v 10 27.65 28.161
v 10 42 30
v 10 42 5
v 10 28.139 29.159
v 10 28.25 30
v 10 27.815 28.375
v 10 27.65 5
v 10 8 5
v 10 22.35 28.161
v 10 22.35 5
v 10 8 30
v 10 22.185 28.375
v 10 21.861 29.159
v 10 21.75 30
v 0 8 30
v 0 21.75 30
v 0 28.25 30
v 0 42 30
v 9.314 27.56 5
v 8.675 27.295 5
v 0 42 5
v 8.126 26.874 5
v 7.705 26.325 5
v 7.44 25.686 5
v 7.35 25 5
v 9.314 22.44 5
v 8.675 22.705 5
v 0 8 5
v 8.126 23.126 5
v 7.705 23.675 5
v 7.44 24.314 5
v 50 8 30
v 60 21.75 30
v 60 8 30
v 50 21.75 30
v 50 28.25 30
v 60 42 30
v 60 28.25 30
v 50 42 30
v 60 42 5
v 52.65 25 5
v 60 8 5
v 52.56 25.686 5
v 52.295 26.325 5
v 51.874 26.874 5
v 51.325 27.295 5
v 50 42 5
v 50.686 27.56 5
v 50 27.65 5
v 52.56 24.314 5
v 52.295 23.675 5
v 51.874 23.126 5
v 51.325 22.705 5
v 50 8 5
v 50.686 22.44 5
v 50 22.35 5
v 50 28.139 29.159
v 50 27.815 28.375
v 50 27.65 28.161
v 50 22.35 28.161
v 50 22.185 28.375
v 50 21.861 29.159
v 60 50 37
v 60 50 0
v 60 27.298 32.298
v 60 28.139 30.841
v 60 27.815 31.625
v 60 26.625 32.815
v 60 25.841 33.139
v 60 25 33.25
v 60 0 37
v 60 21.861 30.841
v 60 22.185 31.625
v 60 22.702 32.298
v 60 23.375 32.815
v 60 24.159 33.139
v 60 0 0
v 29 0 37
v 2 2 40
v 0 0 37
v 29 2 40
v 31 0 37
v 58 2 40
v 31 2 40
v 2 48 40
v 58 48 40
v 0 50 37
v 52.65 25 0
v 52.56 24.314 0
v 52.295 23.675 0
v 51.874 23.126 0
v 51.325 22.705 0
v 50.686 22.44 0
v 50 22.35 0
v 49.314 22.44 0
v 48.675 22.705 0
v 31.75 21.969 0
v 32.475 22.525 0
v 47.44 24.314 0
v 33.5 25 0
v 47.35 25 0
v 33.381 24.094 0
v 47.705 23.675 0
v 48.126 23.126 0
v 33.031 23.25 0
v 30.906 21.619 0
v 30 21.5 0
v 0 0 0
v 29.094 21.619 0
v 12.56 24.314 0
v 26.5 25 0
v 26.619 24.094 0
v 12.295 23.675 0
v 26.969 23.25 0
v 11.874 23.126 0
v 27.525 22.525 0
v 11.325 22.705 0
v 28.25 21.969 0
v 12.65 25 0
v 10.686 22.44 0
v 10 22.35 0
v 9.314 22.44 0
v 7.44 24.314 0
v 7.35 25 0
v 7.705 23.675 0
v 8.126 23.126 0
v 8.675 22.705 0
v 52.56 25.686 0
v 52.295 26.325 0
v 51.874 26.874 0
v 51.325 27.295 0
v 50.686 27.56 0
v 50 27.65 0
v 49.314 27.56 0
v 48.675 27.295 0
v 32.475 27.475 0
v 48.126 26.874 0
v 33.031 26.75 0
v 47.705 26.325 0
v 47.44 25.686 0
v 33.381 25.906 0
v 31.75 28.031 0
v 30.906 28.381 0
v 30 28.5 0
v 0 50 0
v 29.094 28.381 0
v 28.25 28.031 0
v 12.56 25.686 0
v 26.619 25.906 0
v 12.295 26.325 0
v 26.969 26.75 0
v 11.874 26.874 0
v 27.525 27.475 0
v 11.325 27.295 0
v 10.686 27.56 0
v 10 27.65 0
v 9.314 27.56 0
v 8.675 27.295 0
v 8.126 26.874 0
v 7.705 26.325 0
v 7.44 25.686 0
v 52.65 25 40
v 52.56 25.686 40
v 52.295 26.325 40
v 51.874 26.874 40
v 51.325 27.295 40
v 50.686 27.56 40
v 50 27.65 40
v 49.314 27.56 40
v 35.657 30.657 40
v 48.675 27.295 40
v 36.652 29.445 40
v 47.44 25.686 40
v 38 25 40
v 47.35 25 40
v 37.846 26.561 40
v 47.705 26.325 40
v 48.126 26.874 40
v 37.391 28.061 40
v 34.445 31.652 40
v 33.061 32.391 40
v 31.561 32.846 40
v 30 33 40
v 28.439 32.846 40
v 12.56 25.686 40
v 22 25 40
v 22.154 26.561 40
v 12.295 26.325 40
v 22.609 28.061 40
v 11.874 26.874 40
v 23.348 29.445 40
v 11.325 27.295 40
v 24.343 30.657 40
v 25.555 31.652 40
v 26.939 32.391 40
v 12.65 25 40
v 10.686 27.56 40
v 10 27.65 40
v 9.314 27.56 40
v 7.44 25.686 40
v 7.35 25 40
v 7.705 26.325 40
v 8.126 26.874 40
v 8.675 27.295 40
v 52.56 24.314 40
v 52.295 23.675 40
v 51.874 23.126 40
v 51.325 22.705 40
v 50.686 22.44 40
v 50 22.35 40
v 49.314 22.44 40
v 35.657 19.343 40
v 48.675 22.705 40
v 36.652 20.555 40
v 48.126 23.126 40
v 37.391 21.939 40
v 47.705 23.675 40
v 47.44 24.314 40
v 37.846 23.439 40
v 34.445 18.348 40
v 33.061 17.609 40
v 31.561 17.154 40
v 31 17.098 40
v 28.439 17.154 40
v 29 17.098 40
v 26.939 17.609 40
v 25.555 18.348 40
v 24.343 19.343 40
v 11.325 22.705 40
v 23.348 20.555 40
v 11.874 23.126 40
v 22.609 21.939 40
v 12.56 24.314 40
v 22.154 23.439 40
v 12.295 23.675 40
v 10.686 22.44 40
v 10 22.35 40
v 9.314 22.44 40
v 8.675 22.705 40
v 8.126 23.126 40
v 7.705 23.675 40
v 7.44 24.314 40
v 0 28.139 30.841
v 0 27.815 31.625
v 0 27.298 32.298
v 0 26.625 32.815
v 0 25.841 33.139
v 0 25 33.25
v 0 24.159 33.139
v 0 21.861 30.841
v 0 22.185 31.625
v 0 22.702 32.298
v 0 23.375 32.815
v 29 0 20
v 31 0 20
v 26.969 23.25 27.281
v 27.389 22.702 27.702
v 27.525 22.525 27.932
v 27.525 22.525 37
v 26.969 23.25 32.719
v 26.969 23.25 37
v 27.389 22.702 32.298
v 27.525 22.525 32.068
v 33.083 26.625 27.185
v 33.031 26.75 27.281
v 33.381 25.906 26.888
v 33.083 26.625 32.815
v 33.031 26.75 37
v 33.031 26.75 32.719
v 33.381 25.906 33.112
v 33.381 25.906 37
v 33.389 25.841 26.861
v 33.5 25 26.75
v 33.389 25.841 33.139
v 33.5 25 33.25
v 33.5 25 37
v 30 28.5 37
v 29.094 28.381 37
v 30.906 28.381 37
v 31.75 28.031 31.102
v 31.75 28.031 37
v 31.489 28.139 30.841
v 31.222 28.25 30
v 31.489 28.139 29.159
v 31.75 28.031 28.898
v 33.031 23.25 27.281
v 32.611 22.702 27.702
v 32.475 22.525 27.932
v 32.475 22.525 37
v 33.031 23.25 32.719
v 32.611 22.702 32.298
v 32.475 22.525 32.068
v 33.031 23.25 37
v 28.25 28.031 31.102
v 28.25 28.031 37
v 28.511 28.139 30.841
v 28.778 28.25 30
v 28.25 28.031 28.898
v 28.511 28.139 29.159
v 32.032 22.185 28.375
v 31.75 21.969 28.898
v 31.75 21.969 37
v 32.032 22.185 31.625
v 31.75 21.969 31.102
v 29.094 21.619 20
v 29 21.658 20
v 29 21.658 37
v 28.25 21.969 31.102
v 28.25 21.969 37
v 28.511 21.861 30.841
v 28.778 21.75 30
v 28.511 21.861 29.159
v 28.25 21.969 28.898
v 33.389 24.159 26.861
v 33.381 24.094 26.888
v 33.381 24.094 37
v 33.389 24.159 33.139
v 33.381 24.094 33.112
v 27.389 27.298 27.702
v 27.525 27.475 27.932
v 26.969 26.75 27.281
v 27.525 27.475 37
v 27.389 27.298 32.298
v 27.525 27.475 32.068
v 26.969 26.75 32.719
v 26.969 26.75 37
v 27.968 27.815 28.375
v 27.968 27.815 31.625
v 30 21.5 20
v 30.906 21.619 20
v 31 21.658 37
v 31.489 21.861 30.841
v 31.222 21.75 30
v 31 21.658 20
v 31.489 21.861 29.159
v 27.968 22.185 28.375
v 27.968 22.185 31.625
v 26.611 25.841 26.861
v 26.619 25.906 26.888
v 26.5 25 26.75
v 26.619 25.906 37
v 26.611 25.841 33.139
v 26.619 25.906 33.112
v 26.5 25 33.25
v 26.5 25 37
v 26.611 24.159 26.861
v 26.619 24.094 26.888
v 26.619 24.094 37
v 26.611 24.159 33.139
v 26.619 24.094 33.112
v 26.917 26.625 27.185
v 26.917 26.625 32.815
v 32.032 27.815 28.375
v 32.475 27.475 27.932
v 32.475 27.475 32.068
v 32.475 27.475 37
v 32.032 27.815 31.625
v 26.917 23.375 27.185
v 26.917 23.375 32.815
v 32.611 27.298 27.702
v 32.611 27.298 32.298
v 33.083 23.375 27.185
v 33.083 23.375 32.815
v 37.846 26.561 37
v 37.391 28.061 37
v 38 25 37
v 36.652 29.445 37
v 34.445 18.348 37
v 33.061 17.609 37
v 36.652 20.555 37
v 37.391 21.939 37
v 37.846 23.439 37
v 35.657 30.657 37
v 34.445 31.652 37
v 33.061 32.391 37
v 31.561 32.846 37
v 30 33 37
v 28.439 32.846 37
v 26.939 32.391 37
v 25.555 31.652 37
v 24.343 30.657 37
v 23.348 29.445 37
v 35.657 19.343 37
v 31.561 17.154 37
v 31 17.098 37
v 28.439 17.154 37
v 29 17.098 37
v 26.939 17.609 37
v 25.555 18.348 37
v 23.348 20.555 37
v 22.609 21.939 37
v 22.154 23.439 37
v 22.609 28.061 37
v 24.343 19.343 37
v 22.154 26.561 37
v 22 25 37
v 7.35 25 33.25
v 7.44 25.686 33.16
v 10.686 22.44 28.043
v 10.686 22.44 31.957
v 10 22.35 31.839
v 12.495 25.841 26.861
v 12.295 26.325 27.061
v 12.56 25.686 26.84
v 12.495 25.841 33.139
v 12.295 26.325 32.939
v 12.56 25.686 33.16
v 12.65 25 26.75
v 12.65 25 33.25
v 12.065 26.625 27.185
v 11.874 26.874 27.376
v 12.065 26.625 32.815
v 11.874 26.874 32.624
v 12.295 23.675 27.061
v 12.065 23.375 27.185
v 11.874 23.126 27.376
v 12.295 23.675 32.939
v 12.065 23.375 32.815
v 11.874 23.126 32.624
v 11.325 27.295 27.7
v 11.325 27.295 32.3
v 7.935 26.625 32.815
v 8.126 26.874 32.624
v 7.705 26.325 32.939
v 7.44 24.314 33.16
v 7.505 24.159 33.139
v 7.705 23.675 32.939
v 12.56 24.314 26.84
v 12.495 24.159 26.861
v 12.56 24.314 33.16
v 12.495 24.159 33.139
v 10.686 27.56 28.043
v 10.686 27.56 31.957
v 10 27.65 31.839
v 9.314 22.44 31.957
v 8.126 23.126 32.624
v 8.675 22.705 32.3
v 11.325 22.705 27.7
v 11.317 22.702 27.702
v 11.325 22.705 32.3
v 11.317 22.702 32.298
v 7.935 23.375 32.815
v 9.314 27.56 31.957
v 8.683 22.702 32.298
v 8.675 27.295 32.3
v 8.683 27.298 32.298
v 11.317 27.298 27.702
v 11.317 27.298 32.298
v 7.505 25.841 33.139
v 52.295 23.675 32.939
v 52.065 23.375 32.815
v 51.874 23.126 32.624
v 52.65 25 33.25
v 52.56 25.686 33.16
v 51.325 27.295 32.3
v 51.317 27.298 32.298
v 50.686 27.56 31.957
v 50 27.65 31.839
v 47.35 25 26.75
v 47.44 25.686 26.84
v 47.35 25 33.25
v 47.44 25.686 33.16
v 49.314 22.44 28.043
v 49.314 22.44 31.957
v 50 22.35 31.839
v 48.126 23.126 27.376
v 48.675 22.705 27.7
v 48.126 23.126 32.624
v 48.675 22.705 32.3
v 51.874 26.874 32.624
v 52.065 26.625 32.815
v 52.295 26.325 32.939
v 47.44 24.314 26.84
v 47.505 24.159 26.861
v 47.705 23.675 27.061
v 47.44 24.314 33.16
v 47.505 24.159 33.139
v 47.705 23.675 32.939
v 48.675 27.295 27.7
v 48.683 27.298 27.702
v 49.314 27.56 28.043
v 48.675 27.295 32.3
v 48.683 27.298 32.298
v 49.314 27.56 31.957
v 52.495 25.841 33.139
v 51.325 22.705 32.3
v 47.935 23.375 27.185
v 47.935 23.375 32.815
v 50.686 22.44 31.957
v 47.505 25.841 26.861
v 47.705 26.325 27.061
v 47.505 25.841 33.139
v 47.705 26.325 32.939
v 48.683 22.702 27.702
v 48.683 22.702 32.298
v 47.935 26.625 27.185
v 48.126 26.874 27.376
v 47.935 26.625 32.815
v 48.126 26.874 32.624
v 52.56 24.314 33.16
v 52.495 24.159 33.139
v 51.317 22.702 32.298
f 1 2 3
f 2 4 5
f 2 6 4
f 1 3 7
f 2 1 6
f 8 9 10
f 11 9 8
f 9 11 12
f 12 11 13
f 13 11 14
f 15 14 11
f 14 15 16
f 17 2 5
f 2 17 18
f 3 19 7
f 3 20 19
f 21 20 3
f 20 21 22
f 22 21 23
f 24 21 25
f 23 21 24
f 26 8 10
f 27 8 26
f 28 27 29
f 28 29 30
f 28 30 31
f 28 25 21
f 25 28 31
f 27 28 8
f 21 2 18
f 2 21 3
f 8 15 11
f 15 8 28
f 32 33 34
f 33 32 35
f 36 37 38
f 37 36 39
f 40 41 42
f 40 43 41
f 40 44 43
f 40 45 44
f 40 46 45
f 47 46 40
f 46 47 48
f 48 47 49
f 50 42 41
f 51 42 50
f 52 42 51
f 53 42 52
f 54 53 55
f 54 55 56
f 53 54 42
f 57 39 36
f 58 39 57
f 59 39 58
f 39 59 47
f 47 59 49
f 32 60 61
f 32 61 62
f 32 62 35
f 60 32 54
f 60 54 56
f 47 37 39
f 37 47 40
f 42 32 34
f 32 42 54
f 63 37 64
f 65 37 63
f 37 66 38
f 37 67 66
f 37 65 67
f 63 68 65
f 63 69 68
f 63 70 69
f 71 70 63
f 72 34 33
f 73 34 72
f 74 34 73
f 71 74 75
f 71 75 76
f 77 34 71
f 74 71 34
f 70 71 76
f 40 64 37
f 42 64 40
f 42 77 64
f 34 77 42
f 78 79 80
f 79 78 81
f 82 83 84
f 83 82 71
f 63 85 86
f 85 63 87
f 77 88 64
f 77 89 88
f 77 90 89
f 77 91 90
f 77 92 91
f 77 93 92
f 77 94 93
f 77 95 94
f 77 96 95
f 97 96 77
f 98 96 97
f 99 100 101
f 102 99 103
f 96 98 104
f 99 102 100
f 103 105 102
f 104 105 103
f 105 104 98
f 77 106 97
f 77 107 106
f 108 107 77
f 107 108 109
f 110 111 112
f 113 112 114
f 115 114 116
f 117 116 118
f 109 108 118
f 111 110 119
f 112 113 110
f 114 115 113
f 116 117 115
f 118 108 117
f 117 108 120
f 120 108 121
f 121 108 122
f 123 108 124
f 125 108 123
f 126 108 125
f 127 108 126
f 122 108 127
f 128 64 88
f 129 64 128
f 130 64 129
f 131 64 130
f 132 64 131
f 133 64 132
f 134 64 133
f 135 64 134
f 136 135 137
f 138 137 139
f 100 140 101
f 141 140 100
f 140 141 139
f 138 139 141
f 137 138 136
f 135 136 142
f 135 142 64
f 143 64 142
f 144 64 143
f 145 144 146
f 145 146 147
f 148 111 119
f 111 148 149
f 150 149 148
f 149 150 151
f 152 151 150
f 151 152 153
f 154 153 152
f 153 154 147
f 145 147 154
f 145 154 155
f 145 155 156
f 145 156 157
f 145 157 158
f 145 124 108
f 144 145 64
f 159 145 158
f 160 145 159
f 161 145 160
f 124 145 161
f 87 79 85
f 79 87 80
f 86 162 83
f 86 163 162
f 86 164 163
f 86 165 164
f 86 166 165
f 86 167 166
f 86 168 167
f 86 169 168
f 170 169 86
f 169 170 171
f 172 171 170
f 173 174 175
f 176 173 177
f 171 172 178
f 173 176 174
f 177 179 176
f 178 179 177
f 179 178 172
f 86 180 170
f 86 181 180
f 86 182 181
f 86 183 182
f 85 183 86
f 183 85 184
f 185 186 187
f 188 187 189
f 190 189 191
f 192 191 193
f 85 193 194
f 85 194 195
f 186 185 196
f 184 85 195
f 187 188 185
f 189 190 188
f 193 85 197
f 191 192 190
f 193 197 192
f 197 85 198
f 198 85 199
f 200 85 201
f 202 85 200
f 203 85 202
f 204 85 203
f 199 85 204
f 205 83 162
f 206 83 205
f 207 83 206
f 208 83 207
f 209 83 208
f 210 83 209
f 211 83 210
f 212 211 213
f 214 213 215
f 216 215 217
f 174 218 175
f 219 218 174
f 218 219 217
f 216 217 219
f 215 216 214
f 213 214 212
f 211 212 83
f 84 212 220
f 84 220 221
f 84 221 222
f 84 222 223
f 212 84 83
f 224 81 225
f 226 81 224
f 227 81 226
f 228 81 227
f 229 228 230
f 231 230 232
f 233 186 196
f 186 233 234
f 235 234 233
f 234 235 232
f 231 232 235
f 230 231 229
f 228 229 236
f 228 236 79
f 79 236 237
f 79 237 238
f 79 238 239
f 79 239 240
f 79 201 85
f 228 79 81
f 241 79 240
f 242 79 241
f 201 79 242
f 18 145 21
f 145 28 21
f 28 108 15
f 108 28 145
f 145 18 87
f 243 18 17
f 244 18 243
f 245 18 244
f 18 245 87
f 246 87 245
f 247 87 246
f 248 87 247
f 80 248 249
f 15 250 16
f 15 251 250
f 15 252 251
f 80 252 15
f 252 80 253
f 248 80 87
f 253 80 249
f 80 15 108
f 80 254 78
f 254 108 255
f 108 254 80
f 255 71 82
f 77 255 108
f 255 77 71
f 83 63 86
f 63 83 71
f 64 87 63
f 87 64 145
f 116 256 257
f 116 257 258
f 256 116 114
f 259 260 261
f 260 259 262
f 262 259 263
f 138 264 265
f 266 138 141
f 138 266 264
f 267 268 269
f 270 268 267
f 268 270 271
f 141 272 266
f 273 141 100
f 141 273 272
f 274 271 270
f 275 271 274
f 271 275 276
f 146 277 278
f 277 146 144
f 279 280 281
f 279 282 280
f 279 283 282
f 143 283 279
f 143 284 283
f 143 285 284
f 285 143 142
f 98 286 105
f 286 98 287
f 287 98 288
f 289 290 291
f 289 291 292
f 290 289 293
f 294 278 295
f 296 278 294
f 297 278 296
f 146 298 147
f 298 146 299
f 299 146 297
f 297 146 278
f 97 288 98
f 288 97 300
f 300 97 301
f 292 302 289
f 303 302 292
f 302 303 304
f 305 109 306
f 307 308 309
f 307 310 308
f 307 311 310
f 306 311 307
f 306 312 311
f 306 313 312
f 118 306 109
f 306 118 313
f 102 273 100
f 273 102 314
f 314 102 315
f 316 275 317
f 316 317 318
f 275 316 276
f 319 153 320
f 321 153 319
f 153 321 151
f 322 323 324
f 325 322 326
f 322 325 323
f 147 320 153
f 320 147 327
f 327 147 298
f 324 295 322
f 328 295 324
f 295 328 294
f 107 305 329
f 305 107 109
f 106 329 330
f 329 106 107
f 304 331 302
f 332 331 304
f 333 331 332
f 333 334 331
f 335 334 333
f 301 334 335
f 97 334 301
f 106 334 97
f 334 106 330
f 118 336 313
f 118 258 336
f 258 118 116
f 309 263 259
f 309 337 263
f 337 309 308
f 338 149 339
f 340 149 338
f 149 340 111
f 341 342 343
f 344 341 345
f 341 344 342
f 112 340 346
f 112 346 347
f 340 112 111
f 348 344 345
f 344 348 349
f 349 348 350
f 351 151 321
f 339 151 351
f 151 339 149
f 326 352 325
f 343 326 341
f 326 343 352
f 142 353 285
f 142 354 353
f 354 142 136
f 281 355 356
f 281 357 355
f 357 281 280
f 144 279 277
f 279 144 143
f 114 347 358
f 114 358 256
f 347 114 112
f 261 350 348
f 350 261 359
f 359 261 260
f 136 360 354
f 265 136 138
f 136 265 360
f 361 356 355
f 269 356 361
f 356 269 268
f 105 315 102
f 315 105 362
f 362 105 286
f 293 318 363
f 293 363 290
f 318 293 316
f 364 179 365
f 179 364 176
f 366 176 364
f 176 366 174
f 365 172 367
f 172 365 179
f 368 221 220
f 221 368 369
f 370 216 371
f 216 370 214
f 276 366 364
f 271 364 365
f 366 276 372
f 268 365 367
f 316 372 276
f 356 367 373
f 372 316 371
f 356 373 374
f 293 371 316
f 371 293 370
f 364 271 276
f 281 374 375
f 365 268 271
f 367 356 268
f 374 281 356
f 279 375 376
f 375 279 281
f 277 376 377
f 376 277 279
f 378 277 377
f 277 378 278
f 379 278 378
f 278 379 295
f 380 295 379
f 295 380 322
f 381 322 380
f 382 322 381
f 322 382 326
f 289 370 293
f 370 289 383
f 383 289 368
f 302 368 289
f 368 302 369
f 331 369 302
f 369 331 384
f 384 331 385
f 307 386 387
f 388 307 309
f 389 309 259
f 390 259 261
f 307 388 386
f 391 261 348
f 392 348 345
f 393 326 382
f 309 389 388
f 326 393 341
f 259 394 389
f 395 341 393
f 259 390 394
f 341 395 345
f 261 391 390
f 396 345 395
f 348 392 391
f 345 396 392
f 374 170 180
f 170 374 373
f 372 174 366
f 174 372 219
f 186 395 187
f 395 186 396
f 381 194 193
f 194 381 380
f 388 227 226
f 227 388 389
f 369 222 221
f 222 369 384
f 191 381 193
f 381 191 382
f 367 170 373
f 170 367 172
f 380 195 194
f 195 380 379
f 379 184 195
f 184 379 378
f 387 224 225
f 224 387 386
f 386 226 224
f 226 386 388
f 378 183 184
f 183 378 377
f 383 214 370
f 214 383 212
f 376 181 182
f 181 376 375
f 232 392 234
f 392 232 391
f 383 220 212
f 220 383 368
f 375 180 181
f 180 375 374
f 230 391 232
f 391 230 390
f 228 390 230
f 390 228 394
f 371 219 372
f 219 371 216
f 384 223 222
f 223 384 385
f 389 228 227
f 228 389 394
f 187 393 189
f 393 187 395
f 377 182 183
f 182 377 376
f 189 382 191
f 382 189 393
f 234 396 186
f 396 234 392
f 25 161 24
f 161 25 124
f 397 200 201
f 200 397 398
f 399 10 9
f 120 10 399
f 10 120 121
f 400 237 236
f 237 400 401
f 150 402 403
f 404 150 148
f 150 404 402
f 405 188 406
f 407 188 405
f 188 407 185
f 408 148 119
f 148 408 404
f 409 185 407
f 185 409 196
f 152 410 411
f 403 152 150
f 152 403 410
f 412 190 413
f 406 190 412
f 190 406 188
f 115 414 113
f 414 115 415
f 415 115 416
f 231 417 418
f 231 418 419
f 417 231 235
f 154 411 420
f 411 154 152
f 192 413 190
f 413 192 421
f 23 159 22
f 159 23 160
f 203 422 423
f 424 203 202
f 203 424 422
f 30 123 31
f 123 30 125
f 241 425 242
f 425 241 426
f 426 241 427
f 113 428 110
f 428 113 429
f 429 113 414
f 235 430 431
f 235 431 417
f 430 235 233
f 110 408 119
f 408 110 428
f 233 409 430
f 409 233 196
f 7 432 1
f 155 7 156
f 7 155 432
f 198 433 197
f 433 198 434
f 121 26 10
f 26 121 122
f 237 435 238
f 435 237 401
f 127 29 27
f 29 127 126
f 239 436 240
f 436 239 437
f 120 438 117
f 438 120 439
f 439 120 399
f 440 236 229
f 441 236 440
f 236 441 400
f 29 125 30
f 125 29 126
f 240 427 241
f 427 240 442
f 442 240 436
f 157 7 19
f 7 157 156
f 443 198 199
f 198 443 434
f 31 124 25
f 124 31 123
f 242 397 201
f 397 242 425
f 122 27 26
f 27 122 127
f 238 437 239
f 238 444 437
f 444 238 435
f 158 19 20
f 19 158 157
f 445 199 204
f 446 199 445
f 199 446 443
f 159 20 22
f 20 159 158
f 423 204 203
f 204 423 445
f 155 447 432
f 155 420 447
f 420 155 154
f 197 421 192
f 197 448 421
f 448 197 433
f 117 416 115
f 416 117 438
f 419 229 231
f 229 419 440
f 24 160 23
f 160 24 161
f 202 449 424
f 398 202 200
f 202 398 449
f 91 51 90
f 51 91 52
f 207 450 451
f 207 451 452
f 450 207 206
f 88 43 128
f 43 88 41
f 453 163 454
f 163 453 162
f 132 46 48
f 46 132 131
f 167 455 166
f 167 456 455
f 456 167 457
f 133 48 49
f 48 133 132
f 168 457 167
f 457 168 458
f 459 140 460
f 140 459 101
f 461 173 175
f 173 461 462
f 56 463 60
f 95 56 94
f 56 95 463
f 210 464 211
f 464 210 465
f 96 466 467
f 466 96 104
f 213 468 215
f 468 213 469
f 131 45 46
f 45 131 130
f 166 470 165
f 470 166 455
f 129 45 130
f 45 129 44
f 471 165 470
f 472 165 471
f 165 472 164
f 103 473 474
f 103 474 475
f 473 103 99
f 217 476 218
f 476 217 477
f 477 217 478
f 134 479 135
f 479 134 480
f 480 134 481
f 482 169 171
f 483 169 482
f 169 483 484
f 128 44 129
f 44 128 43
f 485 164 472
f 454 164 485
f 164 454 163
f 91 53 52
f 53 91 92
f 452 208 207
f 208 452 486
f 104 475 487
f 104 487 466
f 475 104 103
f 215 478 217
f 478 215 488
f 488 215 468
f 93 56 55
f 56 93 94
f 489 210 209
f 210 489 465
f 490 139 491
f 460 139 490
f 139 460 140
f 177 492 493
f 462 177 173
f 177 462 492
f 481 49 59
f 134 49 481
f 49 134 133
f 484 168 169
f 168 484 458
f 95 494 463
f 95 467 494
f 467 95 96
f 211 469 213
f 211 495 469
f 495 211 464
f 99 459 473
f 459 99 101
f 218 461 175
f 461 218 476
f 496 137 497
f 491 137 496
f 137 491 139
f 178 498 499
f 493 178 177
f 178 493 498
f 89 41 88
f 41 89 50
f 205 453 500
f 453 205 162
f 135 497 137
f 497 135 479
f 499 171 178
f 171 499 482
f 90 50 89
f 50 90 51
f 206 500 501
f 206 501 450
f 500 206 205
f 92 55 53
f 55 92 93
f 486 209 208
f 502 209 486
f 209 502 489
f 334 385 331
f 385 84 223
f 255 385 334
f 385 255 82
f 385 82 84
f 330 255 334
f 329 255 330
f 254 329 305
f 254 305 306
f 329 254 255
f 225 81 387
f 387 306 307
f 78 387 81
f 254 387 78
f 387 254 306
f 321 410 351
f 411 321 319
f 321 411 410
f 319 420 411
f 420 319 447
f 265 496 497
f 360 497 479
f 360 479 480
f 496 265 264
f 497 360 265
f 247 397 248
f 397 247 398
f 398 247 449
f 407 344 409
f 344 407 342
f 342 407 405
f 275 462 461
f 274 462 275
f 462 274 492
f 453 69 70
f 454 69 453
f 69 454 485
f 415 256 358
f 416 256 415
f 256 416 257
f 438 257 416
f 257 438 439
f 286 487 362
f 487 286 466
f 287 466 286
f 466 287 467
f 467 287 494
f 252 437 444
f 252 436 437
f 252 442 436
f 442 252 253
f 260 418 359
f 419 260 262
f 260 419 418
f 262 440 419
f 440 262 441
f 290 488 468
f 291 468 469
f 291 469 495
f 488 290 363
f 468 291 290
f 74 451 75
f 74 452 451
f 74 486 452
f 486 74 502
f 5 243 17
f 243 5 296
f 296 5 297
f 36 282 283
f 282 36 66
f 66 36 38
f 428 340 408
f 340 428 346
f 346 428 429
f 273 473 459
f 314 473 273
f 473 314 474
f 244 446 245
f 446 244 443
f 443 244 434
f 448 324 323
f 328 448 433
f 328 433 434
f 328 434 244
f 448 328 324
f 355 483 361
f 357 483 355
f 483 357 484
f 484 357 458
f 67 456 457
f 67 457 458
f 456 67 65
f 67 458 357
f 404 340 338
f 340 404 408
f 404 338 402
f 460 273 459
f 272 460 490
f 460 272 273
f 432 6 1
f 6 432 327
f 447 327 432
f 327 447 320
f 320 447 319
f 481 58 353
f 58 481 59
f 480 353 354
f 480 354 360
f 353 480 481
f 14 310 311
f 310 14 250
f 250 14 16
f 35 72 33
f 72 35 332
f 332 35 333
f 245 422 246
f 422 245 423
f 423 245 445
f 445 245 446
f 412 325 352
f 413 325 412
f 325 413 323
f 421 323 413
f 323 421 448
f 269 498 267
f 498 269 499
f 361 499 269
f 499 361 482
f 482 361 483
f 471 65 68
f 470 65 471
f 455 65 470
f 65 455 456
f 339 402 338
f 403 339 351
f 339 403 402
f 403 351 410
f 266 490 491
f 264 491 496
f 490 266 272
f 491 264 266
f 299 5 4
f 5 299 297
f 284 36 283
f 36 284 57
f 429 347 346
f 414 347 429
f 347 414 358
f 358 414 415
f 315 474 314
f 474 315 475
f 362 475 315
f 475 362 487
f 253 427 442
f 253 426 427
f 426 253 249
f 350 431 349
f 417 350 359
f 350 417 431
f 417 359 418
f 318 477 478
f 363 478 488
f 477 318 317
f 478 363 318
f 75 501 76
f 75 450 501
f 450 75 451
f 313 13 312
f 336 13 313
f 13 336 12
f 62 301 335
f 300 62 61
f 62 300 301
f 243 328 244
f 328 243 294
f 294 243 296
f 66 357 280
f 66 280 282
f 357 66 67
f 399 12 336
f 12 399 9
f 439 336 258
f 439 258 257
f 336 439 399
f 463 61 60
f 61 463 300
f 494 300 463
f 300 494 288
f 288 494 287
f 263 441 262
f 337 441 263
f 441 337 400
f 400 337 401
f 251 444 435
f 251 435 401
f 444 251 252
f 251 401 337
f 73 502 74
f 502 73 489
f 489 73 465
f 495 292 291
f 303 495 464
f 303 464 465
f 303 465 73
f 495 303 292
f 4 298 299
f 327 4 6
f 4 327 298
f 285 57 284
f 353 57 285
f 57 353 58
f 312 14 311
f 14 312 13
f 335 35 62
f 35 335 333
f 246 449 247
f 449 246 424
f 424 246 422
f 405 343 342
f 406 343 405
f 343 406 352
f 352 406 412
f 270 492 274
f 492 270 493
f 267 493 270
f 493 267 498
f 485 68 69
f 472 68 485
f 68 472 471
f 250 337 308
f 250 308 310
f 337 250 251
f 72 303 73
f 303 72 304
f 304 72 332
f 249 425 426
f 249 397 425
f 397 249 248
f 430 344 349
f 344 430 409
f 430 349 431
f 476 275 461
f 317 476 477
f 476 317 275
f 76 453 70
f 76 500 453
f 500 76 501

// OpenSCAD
// ============================================================
// HEM-001 — Latitude Adjustment Base: TANGENT ARM BLOCK
// Sits on the azimuth plate, under the front of the altitude plate.
// M8 lead screw threads through it and pushes up on the altitude plate.
// Material: 6061-T6 Aluminium, machined from 60×50×40mm block
// Part No: HEM-LAT-004
// Revision: 1.0 | 2026-06
// ============================================================
//
// HOW THE TANGENT ARM WORKS:
// The block is fixed to the azimuth plate (M5 × 2 bolts).
// An M8 threaded rod passes vertically through the block.
// A large D50mm knurled knob on top drives the rod in/out.
// The tip of the rod contacts the underside of the altitude plate.
// Turning the knob raises or lowers the front of the altitude plate,
// tilting it about the rear hinge pivot — setting the latitude angle.
//
// SCALE CALCULATION:
// Pivot-to-contact distance (tangent arm length) = 180mm (see alt plate)
// At latitude θ, lead screw extension = 180 × tan(θ)
// 1 revolution of M8 rod (1.25mm pitch) = 1.25mm linear = 0.40° at 53°
// Full M8 rod travel needed for 0-70°: 180 × tan(70°) = 495mm — use 200mm rod
// Practical range with 150mm rod: 0° to arctan(150/180) ≈ 39° minimum
// For UK (53°): rod extension = 180 × tan(53.41°) = 242mm — use 300mm M8 rod
//   and adjust datum (compress spring preload) to start from 30° rather than 0°
//
// LOCKING:
// A nylon-insert lock nut on the M8 rod provides friction hold.
// A secondary M6 clamp bolt through a split in the block adds positive lock.
// ============================================================

// ---- PARAMETERS ----

BLOCK_W  = 60;   // mm — block width
BLOCK_D  = 50;   // mm — block depth (front-back)
BLOCK_H  = 40;   // mm — block height

// Lead screw bore
SCREW_BORE   = 7.0;    // mm — M8 minor diameter + clearance for threading in
// NOTE: Tap M8 through full block height OR use a brass M8 insert
SCREW_INSERT = 14;     // mm — OD of brass M8 threaded insert (if used)
SCREW_X      = BLOCK_W/2;
SCREW_Y      = BLOCK_D/2;

// Base mounting holes (M5 × 2, through block, into azimuth plate top face)
MOUNT_BOLT   = 5.3;    // mm — M5 clearance
MOUNT_X_OFFSET = 20;   // mm — half spacing X

// Split clamp slot (for secondary locking)
SPLIT_W      = 2;      // mm — slot width (saw cut)
SPLIT_H      = 20;     // mm — slot depth from top
CLAMP_BOLT_H = BLOCK_H - SPLIT_H/2;  // height of M6 clamping bolt

// Contact pad recess (top face — optional brass or PTFE wear pad)
PAD_D        = 16;     // mm — contact pad diameter
PAD_H        = 3;      // mm — recess depth

// ---- GEOMETRY ----

module tangent_arm_block() {
    difference() {
        // Main block with chamfered top edges
        hull() {
            translate([2, 2, 0]) cube([BLOCK_W-4, BLOCK_D-4, BLOCK_H]);
            translate([0, 0, 0]) cube([BLOCK_W, BLOCK_D, BLOCK_H-3]);
        }

        // ---- LEAD SCREW BORE (M8 — vertical, through full height) ----
        translate([SCREW_X, SCREW_Y, -0.5])
            cylinder(d=SCREW_BORE, h=BLOCK_H+1, $fn=24);

        // ---- CONTACT PAD RECESS (top face) ----
        translate([SCREW_X, SCREW_Y, BLOCK_H - PAD_H])
            cylinder(d=PAD_D, h=PAD_H+0.5, $fn=32);

        // ---- BASE MOUNTING HOLES (2× M5, through bottom) ----
        translate([SCREW_X - MOUNT_X_OFFSET, SCREW_Y, -0.5])
            cylinder(d=MOUNT_BOLT, h=BLOCK_H+1, $fn=24);
        translate([SCREW_X + MOUNT_X_OFFSET, SCREW_Y, -0.5])
            cylinder(d=MOUNT_BOLT, h=BLOCK_H+1, $fn=24);

        // ---- SPLIT CLAMP SLOT (front face — vertical saw cut) ----
        translate([SCREW_X - SPLIT_W/2, -0.5, BLOCK_H - SPLIT_H])
            cube([SPLIT_W, BLOCK_D/2 + 1, SPLIT_H + 0.5]);

        // ---- CLAMP BOLT HOLE (horizontal, M6, through split) ----
        translate([-0.5, SCREW_Y, CLAMP_BOLT_H])
            rotate([0, 90, 0])
                cylinder(d=6.5, h=BLOCK_W+1, $fn=24);

        // ---- WEIGHT REDUCTION POCKETS (sides) ----
        for (side = [0, 1]) {
            translate([side == 0 ? -0.5 : BLOCK_W - 10, 8, 5])
                cube([10.5, BLOCK_D - 16, BLOCK_H - 15]);
        }
    }
}

tangent_arm_block();
